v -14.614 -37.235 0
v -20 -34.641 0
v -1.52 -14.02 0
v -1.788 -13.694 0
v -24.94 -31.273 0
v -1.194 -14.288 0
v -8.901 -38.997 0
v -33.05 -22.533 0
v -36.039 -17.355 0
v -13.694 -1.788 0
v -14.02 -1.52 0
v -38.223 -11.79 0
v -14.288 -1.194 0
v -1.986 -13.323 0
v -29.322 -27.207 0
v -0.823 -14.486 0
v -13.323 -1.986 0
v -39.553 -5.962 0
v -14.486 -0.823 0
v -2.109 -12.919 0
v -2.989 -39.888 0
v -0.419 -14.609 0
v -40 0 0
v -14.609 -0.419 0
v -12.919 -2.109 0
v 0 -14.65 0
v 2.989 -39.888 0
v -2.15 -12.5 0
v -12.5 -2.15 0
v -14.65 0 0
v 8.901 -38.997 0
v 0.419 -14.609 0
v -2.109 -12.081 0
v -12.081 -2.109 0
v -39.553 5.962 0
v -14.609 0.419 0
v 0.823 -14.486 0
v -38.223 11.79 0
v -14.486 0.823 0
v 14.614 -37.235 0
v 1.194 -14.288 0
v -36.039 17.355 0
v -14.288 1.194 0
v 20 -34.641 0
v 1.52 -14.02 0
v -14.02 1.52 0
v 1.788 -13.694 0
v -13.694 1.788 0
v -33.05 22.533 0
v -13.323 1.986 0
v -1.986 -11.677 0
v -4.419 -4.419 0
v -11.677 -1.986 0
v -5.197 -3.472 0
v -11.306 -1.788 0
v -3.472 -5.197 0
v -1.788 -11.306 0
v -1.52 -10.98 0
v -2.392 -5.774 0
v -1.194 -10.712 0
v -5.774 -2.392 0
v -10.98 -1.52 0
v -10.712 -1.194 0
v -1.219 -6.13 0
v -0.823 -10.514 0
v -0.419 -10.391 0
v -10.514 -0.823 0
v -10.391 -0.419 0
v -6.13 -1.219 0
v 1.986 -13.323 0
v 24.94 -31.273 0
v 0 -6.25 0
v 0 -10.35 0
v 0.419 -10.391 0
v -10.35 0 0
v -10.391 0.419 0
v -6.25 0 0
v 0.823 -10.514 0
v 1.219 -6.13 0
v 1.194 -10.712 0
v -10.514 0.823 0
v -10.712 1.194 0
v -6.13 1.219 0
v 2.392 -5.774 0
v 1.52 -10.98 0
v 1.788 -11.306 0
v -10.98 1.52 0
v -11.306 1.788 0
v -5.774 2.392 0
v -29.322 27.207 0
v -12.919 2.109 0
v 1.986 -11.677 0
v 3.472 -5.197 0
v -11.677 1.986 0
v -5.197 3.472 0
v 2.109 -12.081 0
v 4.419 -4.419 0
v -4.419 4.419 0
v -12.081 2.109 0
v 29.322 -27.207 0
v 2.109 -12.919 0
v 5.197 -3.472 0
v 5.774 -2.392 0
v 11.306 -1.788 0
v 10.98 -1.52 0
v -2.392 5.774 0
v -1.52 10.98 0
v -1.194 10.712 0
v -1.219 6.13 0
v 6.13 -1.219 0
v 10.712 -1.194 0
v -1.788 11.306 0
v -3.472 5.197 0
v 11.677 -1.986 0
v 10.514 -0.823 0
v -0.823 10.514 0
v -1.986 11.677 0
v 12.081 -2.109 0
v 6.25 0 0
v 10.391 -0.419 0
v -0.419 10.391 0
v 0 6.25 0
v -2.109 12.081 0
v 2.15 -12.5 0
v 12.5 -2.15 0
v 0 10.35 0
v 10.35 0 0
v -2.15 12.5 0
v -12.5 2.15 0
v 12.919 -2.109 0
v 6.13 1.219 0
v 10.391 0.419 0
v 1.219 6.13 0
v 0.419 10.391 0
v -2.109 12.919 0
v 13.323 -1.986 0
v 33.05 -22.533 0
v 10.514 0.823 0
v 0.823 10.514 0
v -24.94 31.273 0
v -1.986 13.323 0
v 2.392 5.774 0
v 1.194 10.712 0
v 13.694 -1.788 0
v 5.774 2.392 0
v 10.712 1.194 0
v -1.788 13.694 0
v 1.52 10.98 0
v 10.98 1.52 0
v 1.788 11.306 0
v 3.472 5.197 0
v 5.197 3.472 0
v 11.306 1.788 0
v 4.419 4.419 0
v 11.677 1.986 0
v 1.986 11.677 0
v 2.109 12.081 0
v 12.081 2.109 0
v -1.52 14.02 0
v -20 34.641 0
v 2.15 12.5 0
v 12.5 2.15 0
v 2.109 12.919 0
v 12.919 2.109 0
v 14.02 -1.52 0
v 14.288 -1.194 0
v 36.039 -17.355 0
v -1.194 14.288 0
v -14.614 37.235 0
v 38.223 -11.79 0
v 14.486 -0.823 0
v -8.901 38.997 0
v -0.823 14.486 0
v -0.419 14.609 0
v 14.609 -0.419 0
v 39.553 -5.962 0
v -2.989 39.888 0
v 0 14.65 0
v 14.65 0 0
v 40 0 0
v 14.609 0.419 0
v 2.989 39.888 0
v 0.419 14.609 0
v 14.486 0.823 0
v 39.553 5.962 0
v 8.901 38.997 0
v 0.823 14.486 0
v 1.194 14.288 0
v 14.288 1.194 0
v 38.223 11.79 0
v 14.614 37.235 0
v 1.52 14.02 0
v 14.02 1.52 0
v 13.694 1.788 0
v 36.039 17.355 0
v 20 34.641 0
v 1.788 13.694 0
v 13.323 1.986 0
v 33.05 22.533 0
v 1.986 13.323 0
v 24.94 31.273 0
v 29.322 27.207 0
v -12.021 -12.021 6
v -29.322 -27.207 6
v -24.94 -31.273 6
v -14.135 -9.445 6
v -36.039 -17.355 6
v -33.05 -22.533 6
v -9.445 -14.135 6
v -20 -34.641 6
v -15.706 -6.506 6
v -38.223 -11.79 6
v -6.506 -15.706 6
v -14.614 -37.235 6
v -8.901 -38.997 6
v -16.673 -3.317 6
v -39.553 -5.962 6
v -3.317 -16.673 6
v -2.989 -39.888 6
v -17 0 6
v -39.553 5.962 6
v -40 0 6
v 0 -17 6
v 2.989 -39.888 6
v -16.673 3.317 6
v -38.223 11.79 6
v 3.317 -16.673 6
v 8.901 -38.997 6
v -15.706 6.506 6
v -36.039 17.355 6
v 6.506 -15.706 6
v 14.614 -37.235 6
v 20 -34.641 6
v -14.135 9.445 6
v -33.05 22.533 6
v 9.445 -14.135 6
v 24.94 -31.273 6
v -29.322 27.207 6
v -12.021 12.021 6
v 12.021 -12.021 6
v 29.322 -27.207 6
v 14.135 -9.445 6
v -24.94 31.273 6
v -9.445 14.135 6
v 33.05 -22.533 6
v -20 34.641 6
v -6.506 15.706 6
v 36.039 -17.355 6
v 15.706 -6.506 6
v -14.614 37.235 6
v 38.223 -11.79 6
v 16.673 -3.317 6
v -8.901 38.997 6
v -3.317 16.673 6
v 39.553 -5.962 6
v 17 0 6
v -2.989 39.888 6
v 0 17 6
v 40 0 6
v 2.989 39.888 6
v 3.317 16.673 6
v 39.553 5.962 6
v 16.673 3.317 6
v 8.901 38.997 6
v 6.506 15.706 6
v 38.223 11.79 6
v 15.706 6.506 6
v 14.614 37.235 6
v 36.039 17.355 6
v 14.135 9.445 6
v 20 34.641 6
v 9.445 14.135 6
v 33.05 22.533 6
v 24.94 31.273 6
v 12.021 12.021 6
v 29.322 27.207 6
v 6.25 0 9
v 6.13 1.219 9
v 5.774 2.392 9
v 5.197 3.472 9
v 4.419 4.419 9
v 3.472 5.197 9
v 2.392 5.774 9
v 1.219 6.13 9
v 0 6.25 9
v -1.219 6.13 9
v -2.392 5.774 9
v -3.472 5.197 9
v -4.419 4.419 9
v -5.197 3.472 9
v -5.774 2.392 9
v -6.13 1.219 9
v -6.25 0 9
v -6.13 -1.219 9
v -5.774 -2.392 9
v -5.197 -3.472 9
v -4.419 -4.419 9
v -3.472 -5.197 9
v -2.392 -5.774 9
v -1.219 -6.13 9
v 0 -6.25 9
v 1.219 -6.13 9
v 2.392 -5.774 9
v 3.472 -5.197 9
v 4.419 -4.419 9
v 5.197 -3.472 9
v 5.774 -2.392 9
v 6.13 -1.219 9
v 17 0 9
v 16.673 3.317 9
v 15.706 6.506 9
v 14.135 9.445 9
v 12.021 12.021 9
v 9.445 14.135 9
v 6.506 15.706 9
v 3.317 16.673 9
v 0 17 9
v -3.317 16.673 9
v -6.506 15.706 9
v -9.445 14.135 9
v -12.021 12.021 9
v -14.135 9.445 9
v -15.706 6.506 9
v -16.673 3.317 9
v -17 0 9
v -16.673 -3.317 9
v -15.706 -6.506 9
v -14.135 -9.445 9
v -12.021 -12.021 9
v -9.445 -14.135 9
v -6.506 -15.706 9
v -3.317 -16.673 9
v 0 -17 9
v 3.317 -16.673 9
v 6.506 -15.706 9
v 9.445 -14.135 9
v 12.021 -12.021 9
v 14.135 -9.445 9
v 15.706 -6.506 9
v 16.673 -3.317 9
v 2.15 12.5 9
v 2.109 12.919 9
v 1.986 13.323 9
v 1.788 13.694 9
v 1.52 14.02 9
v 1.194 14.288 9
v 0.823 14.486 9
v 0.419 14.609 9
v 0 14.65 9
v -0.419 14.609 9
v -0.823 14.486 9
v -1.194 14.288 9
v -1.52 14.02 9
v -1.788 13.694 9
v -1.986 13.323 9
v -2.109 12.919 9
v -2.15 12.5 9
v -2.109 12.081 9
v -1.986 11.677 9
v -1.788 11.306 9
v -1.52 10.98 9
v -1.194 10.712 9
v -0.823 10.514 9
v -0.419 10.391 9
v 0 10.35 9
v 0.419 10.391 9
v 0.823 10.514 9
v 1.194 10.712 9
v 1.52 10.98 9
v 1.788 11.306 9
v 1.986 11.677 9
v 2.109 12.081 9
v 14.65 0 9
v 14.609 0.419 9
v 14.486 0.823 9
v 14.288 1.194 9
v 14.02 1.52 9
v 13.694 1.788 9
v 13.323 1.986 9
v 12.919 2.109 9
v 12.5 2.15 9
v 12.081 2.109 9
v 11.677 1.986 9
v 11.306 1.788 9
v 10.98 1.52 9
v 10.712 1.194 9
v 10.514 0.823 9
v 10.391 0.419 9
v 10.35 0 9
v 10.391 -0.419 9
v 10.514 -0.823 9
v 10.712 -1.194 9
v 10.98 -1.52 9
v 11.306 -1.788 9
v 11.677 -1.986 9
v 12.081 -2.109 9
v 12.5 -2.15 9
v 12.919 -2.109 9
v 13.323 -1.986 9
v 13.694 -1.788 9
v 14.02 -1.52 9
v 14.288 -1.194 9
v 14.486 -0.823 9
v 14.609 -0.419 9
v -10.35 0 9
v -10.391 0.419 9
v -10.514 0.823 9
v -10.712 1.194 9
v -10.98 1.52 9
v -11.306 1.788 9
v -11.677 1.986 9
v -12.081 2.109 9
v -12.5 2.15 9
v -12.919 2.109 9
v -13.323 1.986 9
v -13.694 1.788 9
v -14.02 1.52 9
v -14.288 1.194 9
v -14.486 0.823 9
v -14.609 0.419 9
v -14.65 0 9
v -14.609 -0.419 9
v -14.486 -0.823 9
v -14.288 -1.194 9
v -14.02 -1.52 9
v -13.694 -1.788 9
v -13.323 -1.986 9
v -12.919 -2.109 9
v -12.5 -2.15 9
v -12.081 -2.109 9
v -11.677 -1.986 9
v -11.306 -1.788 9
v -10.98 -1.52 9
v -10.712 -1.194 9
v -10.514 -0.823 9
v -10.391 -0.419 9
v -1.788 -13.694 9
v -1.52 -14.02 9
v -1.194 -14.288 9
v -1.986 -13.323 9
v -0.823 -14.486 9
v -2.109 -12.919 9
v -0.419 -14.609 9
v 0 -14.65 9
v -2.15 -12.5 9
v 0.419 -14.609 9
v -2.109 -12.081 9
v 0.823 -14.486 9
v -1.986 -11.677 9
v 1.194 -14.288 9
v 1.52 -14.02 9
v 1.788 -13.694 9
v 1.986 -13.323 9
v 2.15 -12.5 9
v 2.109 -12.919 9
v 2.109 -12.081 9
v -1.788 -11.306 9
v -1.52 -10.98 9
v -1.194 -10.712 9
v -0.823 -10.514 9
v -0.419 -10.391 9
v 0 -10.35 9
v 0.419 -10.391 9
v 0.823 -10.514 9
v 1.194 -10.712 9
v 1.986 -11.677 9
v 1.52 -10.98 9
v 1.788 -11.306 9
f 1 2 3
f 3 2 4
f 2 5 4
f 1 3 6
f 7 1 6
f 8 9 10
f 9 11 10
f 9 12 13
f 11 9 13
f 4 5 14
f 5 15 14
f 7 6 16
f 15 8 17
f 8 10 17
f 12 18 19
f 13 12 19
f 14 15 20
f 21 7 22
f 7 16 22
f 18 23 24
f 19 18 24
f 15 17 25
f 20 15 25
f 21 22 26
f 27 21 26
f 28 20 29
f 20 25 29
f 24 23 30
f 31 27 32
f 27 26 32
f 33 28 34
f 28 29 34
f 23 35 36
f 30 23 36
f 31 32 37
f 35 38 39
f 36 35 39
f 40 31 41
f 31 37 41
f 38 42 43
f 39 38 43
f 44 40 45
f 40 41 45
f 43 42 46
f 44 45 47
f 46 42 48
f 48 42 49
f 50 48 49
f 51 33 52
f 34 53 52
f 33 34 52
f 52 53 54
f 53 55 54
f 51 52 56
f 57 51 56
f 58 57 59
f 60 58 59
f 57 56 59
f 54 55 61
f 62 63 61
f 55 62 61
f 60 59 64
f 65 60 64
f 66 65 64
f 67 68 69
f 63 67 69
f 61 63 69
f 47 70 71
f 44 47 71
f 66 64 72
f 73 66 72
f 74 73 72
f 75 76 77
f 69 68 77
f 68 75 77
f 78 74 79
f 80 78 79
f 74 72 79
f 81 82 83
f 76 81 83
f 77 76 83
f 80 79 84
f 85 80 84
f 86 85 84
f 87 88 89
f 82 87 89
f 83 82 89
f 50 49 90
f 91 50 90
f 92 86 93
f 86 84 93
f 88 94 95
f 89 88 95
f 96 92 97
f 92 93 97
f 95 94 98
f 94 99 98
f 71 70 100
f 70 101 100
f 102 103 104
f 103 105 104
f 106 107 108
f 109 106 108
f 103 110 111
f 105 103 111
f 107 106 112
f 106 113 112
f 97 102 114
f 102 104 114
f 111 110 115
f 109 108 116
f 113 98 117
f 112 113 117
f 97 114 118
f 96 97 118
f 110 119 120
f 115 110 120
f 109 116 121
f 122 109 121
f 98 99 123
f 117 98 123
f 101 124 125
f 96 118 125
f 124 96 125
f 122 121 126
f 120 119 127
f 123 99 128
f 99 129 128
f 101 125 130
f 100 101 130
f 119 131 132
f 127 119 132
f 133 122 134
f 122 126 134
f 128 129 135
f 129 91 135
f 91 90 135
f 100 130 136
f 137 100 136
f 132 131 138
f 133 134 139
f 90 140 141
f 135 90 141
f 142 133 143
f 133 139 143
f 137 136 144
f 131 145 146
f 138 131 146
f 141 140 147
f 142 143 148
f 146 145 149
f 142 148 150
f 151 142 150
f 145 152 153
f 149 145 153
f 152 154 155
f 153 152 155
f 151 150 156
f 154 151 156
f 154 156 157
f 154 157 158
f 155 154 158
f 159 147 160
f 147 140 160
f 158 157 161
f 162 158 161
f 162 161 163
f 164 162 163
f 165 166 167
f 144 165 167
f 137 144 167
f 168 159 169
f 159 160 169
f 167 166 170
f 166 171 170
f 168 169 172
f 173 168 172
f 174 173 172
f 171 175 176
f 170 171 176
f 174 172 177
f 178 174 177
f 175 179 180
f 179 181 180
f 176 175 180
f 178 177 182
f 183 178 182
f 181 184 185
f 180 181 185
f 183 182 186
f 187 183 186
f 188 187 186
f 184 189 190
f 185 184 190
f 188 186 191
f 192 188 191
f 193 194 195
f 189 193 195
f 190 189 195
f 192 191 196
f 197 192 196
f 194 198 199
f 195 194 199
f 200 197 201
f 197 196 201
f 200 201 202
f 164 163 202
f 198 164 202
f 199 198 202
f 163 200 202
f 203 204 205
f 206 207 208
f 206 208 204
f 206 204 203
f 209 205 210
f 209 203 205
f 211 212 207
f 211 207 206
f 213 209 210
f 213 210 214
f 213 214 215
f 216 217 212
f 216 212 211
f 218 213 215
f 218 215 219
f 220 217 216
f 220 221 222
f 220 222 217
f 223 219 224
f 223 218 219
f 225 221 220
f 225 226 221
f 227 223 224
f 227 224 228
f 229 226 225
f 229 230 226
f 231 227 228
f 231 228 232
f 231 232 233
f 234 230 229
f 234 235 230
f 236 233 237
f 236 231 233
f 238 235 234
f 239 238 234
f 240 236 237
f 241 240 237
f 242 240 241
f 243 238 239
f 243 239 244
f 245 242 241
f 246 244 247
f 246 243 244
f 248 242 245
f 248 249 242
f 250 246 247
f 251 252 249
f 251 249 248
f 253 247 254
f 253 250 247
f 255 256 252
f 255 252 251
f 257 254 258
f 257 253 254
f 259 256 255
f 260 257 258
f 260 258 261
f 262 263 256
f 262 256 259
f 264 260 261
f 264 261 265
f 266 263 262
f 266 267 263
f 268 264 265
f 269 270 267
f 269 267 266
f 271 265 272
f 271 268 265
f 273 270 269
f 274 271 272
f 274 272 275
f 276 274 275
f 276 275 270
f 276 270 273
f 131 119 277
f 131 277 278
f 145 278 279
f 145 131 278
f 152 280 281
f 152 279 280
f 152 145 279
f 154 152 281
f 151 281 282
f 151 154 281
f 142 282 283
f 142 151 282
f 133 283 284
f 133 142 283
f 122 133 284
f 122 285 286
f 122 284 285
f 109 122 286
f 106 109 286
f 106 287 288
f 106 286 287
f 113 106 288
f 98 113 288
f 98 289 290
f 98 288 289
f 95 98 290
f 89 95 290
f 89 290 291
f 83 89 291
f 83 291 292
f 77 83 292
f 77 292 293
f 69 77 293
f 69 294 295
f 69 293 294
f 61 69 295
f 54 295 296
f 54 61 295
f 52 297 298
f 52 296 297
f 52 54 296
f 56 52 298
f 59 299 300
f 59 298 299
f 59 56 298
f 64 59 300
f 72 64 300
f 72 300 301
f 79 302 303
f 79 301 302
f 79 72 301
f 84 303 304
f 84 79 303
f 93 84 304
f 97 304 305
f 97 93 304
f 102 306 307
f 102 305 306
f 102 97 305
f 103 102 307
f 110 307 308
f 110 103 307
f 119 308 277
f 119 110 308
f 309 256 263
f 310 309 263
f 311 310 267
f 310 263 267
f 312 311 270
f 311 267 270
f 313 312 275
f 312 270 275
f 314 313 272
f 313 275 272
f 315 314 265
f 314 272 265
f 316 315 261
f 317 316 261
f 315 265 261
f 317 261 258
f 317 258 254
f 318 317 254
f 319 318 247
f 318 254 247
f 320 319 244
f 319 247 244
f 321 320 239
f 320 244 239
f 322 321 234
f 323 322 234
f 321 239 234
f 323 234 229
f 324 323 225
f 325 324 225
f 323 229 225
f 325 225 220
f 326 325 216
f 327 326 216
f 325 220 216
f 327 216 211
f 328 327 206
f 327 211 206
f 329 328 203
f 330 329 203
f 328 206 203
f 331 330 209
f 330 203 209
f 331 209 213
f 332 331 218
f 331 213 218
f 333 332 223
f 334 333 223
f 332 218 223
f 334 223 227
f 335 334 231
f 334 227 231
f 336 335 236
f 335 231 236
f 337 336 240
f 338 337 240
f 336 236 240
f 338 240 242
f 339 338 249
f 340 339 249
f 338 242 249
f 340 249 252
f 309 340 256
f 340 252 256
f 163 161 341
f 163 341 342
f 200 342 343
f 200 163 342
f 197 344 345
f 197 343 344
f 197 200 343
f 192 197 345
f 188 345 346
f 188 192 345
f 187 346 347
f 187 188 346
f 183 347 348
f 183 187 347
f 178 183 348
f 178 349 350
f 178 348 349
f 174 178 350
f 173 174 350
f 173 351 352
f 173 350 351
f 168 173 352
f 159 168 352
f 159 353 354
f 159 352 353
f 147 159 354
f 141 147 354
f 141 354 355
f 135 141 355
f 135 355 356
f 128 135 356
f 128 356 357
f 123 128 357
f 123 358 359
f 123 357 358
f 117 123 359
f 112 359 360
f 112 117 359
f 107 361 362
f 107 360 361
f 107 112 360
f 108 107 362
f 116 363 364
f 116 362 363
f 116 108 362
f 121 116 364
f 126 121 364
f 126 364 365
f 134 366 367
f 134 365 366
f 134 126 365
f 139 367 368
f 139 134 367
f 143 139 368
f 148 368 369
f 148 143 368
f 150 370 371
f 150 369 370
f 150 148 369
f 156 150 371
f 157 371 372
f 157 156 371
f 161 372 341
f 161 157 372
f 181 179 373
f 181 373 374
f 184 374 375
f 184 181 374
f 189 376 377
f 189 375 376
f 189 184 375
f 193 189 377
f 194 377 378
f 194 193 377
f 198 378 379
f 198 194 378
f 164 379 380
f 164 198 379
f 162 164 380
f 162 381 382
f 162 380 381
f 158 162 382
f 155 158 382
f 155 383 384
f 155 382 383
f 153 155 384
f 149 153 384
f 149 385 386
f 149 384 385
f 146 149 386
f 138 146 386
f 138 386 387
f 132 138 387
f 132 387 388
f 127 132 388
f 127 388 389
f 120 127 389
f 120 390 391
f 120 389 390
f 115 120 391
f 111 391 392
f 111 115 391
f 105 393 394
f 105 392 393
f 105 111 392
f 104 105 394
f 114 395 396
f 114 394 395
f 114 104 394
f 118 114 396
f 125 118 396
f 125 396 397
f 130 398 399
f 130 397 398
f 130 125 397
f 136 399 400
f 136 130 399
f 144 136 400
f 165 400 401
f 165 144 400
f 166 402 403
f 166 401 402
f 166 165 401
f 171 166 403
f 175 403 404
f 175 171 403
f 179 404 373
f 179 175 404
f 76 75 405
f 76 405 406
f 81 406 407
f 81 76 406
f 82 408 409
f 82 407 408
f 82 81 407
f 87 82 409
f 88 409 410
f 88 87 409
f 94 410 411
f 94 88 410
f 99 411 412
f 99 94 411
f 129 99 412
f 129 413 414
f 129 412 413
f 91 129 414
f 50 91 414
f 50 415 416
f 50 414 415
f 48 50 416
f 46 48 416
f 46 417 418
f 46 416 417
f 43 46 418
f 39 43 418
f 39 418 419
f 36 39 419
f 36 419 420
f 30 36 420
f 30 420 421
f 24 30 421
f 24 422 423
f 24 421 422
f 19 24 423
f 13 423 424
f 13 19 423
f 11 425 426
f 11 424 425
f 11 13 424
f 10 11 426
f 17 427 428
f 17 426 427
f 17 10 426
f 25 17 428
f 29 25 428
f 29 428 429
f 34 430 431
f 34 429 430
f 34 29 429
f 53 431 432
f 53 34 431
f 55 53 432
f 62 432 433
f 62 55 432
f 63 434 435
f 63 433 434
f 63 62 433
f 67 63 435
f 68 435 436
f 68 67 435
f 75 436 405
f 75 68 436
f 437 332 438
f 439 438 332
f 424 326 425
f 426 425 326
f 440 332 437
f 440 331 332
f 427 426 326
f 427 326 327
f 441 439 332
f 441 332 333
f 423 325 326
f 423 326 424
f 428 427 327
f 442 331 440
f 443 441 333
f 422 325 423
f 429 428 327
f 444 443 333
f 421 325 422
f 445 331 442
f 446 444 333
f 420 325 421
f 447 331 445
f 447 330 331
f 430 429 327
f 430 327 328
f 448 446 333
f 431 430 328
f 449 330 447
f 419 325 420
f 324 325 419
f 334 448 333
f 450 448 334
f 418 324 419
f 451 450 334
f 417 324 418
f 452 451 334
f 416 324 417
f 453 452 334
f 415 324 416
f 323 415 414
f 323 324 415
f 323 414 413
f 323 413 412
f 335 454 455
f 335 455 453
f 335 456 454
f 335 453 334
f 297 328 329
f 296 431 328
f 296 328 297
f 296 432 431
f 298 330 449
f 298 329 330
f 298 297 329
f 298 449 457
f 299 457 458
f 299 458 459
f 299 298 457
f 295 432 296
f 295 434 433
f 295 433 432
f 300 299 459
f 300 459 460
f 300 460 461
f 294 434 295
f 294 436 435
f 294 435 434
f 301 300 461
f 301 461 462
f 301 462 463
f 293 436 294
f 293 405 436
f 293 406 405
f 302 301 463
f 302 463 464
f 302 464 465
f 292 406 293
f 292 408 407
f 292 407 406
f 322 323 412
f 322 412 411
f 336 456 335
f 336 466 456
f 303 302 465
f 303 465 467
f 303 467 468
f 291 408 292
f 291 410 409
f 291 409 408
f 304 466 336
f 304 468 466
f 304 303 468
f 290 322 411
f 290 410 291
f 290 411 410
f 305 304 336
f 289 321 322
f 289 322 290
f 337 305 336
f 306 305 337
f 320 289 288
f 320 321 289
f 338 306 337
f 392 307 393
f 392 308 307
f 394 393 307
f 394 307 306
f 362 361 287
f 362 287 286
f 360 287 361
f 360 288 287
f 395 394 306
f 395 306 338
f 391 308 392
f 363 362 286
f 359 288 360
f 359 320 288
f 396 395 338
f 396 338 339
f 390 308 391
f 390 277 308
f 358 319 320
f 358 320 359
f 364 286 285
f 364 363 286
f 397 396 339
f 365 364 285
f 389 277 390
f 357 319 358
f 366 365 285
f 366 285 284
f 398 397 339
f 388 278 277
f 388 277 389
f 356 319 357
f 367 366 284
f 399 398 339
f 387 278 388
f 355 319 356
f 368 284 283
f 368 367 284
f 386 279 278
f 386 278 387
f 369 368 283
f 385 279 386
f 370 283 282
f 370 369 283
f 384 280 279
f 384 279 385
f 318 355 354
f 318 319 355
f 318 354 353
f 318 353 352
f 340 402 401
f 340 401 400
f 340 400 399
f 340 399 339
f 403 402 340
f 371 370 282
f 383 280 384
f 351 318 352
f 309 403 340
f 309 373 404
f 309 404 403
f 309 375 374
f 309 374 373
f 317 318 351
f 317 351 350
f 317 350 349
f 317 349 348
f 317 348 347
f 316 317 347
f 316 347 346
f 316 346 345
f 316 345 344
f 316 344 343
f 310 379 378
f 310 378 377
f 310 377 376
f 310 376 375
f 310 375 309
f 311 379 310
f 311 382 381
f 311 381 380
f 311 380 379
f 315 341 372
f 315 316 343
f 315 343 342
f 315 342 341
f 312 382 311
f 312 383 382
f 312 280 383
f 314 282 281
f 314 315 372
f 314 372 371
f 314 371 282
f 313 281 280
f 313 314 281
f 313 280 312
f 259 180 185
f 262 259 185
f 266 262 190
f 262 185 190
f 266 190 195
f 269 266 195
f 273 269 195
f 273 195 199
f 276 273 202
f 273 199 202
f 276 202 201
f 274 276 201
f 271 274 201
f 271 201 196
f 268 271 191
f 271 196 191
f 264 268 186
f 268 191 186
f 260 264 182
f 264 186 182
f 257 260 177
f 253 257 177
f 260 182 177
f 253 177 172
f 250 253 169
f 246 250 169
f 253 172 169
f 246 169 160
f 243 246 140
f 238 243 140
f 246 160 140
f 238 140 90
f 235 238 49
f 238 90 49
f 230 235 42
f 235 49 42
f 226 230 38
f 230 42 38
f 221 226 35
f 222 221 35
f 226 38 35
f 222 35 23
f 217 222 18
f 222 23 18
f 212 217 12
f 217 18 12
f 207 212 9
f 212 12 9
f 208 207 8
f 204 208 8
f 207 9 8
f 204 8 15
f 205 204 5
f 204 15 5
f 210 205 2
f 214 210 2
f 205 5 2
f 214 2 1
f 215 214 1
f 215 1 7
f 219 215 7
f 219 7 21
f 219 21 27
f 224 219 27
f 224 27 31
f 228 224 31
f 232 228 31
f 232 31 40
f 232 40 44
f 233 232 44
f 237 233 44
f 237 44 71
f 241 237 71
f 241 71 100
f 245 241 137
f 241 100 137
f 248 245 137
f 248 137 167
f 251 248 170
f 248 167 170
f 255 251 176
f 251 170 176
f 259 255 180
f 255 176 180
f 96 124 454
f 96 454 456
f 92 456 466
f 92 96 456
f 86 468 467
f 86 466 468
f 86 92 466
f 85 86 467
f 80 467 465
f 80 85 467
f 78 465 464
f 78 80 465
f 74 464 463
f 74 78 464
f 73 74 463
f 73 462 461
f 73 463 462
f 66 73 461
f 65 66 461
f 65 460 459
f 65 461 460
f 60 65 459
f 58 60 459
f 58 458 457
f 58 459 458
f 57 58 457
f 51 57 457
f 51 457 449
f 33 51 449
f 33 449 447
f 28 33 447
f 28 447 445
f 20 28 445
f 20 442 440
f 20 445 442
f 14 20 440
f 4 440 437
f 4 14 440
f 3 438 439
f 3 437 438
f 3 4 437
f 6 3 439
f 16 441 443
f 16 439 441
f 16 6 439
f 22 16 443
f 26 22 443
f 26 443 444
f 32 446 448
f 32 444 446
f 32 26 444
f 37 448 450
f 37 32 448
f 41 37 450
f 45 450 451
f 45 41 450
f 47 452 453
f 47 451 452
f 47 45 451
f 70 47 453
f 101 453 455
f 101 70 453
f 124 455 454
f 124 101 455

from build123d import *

# Parameters (mm, degrees)
SKETCH1_R               = 40
BOSS_EXTRUDE1_DEPTH     = 6
SKETCH2_R               = 17
BOSS_EXTRUDE2_DEPTH     = 3
CUT_EXTRUDE1_DEPTH      = 58.280013966
CUT_EXTRUDE1_DEPTH_BACK = 58.280013966
SKETCH3_R               = 6.25
SKETCH3_R_2             = 2.15


with BuildPart() as part:
    # Sketch1 → Boss-Extrude1 (new body)
    with BuildSketch(Plane.XY):
        Circle(SKETCH1_R)
    extrude(amount=BOSS_EXTRUDE1_DEPTH)

    # Sketch2 → Boss-Extrude2 (add)
    with BuildSketch(Plane.XY.offset(6)):
        Circle(SKETCH2_R)
    extrude(amount=BOSS_EXTRUDE2_DEPTH)

    # Sketch3 → Cut-Extrude1 (cut, two sides: drawn at the far end of the back side and taken through both)
    with BuildSketch(Plane.XY.offset(9).offset(-CUT_EXTRUDE1_DEPTH_BACK)):
        Circle(SKETCH3_R)
        with Locations((0, 12.5)):
            Circle(SKETCH3_R_2)
        with Locations((12.5, 0)):
            Circle(SKETCH3_R_2)
        with Locations((0, -12.5)):
            Circle(SKETCH3_R_2)
        with Locations((-12.5, 0)):
            Circle(SKETCH3_R_2)
    extrude(amount=CUT_EXTRUDE1_DEPTH + CUT_EXTRUDE1_DEPTH_BACK, mode=Mode.SUBTRACT)


solid = part.part
